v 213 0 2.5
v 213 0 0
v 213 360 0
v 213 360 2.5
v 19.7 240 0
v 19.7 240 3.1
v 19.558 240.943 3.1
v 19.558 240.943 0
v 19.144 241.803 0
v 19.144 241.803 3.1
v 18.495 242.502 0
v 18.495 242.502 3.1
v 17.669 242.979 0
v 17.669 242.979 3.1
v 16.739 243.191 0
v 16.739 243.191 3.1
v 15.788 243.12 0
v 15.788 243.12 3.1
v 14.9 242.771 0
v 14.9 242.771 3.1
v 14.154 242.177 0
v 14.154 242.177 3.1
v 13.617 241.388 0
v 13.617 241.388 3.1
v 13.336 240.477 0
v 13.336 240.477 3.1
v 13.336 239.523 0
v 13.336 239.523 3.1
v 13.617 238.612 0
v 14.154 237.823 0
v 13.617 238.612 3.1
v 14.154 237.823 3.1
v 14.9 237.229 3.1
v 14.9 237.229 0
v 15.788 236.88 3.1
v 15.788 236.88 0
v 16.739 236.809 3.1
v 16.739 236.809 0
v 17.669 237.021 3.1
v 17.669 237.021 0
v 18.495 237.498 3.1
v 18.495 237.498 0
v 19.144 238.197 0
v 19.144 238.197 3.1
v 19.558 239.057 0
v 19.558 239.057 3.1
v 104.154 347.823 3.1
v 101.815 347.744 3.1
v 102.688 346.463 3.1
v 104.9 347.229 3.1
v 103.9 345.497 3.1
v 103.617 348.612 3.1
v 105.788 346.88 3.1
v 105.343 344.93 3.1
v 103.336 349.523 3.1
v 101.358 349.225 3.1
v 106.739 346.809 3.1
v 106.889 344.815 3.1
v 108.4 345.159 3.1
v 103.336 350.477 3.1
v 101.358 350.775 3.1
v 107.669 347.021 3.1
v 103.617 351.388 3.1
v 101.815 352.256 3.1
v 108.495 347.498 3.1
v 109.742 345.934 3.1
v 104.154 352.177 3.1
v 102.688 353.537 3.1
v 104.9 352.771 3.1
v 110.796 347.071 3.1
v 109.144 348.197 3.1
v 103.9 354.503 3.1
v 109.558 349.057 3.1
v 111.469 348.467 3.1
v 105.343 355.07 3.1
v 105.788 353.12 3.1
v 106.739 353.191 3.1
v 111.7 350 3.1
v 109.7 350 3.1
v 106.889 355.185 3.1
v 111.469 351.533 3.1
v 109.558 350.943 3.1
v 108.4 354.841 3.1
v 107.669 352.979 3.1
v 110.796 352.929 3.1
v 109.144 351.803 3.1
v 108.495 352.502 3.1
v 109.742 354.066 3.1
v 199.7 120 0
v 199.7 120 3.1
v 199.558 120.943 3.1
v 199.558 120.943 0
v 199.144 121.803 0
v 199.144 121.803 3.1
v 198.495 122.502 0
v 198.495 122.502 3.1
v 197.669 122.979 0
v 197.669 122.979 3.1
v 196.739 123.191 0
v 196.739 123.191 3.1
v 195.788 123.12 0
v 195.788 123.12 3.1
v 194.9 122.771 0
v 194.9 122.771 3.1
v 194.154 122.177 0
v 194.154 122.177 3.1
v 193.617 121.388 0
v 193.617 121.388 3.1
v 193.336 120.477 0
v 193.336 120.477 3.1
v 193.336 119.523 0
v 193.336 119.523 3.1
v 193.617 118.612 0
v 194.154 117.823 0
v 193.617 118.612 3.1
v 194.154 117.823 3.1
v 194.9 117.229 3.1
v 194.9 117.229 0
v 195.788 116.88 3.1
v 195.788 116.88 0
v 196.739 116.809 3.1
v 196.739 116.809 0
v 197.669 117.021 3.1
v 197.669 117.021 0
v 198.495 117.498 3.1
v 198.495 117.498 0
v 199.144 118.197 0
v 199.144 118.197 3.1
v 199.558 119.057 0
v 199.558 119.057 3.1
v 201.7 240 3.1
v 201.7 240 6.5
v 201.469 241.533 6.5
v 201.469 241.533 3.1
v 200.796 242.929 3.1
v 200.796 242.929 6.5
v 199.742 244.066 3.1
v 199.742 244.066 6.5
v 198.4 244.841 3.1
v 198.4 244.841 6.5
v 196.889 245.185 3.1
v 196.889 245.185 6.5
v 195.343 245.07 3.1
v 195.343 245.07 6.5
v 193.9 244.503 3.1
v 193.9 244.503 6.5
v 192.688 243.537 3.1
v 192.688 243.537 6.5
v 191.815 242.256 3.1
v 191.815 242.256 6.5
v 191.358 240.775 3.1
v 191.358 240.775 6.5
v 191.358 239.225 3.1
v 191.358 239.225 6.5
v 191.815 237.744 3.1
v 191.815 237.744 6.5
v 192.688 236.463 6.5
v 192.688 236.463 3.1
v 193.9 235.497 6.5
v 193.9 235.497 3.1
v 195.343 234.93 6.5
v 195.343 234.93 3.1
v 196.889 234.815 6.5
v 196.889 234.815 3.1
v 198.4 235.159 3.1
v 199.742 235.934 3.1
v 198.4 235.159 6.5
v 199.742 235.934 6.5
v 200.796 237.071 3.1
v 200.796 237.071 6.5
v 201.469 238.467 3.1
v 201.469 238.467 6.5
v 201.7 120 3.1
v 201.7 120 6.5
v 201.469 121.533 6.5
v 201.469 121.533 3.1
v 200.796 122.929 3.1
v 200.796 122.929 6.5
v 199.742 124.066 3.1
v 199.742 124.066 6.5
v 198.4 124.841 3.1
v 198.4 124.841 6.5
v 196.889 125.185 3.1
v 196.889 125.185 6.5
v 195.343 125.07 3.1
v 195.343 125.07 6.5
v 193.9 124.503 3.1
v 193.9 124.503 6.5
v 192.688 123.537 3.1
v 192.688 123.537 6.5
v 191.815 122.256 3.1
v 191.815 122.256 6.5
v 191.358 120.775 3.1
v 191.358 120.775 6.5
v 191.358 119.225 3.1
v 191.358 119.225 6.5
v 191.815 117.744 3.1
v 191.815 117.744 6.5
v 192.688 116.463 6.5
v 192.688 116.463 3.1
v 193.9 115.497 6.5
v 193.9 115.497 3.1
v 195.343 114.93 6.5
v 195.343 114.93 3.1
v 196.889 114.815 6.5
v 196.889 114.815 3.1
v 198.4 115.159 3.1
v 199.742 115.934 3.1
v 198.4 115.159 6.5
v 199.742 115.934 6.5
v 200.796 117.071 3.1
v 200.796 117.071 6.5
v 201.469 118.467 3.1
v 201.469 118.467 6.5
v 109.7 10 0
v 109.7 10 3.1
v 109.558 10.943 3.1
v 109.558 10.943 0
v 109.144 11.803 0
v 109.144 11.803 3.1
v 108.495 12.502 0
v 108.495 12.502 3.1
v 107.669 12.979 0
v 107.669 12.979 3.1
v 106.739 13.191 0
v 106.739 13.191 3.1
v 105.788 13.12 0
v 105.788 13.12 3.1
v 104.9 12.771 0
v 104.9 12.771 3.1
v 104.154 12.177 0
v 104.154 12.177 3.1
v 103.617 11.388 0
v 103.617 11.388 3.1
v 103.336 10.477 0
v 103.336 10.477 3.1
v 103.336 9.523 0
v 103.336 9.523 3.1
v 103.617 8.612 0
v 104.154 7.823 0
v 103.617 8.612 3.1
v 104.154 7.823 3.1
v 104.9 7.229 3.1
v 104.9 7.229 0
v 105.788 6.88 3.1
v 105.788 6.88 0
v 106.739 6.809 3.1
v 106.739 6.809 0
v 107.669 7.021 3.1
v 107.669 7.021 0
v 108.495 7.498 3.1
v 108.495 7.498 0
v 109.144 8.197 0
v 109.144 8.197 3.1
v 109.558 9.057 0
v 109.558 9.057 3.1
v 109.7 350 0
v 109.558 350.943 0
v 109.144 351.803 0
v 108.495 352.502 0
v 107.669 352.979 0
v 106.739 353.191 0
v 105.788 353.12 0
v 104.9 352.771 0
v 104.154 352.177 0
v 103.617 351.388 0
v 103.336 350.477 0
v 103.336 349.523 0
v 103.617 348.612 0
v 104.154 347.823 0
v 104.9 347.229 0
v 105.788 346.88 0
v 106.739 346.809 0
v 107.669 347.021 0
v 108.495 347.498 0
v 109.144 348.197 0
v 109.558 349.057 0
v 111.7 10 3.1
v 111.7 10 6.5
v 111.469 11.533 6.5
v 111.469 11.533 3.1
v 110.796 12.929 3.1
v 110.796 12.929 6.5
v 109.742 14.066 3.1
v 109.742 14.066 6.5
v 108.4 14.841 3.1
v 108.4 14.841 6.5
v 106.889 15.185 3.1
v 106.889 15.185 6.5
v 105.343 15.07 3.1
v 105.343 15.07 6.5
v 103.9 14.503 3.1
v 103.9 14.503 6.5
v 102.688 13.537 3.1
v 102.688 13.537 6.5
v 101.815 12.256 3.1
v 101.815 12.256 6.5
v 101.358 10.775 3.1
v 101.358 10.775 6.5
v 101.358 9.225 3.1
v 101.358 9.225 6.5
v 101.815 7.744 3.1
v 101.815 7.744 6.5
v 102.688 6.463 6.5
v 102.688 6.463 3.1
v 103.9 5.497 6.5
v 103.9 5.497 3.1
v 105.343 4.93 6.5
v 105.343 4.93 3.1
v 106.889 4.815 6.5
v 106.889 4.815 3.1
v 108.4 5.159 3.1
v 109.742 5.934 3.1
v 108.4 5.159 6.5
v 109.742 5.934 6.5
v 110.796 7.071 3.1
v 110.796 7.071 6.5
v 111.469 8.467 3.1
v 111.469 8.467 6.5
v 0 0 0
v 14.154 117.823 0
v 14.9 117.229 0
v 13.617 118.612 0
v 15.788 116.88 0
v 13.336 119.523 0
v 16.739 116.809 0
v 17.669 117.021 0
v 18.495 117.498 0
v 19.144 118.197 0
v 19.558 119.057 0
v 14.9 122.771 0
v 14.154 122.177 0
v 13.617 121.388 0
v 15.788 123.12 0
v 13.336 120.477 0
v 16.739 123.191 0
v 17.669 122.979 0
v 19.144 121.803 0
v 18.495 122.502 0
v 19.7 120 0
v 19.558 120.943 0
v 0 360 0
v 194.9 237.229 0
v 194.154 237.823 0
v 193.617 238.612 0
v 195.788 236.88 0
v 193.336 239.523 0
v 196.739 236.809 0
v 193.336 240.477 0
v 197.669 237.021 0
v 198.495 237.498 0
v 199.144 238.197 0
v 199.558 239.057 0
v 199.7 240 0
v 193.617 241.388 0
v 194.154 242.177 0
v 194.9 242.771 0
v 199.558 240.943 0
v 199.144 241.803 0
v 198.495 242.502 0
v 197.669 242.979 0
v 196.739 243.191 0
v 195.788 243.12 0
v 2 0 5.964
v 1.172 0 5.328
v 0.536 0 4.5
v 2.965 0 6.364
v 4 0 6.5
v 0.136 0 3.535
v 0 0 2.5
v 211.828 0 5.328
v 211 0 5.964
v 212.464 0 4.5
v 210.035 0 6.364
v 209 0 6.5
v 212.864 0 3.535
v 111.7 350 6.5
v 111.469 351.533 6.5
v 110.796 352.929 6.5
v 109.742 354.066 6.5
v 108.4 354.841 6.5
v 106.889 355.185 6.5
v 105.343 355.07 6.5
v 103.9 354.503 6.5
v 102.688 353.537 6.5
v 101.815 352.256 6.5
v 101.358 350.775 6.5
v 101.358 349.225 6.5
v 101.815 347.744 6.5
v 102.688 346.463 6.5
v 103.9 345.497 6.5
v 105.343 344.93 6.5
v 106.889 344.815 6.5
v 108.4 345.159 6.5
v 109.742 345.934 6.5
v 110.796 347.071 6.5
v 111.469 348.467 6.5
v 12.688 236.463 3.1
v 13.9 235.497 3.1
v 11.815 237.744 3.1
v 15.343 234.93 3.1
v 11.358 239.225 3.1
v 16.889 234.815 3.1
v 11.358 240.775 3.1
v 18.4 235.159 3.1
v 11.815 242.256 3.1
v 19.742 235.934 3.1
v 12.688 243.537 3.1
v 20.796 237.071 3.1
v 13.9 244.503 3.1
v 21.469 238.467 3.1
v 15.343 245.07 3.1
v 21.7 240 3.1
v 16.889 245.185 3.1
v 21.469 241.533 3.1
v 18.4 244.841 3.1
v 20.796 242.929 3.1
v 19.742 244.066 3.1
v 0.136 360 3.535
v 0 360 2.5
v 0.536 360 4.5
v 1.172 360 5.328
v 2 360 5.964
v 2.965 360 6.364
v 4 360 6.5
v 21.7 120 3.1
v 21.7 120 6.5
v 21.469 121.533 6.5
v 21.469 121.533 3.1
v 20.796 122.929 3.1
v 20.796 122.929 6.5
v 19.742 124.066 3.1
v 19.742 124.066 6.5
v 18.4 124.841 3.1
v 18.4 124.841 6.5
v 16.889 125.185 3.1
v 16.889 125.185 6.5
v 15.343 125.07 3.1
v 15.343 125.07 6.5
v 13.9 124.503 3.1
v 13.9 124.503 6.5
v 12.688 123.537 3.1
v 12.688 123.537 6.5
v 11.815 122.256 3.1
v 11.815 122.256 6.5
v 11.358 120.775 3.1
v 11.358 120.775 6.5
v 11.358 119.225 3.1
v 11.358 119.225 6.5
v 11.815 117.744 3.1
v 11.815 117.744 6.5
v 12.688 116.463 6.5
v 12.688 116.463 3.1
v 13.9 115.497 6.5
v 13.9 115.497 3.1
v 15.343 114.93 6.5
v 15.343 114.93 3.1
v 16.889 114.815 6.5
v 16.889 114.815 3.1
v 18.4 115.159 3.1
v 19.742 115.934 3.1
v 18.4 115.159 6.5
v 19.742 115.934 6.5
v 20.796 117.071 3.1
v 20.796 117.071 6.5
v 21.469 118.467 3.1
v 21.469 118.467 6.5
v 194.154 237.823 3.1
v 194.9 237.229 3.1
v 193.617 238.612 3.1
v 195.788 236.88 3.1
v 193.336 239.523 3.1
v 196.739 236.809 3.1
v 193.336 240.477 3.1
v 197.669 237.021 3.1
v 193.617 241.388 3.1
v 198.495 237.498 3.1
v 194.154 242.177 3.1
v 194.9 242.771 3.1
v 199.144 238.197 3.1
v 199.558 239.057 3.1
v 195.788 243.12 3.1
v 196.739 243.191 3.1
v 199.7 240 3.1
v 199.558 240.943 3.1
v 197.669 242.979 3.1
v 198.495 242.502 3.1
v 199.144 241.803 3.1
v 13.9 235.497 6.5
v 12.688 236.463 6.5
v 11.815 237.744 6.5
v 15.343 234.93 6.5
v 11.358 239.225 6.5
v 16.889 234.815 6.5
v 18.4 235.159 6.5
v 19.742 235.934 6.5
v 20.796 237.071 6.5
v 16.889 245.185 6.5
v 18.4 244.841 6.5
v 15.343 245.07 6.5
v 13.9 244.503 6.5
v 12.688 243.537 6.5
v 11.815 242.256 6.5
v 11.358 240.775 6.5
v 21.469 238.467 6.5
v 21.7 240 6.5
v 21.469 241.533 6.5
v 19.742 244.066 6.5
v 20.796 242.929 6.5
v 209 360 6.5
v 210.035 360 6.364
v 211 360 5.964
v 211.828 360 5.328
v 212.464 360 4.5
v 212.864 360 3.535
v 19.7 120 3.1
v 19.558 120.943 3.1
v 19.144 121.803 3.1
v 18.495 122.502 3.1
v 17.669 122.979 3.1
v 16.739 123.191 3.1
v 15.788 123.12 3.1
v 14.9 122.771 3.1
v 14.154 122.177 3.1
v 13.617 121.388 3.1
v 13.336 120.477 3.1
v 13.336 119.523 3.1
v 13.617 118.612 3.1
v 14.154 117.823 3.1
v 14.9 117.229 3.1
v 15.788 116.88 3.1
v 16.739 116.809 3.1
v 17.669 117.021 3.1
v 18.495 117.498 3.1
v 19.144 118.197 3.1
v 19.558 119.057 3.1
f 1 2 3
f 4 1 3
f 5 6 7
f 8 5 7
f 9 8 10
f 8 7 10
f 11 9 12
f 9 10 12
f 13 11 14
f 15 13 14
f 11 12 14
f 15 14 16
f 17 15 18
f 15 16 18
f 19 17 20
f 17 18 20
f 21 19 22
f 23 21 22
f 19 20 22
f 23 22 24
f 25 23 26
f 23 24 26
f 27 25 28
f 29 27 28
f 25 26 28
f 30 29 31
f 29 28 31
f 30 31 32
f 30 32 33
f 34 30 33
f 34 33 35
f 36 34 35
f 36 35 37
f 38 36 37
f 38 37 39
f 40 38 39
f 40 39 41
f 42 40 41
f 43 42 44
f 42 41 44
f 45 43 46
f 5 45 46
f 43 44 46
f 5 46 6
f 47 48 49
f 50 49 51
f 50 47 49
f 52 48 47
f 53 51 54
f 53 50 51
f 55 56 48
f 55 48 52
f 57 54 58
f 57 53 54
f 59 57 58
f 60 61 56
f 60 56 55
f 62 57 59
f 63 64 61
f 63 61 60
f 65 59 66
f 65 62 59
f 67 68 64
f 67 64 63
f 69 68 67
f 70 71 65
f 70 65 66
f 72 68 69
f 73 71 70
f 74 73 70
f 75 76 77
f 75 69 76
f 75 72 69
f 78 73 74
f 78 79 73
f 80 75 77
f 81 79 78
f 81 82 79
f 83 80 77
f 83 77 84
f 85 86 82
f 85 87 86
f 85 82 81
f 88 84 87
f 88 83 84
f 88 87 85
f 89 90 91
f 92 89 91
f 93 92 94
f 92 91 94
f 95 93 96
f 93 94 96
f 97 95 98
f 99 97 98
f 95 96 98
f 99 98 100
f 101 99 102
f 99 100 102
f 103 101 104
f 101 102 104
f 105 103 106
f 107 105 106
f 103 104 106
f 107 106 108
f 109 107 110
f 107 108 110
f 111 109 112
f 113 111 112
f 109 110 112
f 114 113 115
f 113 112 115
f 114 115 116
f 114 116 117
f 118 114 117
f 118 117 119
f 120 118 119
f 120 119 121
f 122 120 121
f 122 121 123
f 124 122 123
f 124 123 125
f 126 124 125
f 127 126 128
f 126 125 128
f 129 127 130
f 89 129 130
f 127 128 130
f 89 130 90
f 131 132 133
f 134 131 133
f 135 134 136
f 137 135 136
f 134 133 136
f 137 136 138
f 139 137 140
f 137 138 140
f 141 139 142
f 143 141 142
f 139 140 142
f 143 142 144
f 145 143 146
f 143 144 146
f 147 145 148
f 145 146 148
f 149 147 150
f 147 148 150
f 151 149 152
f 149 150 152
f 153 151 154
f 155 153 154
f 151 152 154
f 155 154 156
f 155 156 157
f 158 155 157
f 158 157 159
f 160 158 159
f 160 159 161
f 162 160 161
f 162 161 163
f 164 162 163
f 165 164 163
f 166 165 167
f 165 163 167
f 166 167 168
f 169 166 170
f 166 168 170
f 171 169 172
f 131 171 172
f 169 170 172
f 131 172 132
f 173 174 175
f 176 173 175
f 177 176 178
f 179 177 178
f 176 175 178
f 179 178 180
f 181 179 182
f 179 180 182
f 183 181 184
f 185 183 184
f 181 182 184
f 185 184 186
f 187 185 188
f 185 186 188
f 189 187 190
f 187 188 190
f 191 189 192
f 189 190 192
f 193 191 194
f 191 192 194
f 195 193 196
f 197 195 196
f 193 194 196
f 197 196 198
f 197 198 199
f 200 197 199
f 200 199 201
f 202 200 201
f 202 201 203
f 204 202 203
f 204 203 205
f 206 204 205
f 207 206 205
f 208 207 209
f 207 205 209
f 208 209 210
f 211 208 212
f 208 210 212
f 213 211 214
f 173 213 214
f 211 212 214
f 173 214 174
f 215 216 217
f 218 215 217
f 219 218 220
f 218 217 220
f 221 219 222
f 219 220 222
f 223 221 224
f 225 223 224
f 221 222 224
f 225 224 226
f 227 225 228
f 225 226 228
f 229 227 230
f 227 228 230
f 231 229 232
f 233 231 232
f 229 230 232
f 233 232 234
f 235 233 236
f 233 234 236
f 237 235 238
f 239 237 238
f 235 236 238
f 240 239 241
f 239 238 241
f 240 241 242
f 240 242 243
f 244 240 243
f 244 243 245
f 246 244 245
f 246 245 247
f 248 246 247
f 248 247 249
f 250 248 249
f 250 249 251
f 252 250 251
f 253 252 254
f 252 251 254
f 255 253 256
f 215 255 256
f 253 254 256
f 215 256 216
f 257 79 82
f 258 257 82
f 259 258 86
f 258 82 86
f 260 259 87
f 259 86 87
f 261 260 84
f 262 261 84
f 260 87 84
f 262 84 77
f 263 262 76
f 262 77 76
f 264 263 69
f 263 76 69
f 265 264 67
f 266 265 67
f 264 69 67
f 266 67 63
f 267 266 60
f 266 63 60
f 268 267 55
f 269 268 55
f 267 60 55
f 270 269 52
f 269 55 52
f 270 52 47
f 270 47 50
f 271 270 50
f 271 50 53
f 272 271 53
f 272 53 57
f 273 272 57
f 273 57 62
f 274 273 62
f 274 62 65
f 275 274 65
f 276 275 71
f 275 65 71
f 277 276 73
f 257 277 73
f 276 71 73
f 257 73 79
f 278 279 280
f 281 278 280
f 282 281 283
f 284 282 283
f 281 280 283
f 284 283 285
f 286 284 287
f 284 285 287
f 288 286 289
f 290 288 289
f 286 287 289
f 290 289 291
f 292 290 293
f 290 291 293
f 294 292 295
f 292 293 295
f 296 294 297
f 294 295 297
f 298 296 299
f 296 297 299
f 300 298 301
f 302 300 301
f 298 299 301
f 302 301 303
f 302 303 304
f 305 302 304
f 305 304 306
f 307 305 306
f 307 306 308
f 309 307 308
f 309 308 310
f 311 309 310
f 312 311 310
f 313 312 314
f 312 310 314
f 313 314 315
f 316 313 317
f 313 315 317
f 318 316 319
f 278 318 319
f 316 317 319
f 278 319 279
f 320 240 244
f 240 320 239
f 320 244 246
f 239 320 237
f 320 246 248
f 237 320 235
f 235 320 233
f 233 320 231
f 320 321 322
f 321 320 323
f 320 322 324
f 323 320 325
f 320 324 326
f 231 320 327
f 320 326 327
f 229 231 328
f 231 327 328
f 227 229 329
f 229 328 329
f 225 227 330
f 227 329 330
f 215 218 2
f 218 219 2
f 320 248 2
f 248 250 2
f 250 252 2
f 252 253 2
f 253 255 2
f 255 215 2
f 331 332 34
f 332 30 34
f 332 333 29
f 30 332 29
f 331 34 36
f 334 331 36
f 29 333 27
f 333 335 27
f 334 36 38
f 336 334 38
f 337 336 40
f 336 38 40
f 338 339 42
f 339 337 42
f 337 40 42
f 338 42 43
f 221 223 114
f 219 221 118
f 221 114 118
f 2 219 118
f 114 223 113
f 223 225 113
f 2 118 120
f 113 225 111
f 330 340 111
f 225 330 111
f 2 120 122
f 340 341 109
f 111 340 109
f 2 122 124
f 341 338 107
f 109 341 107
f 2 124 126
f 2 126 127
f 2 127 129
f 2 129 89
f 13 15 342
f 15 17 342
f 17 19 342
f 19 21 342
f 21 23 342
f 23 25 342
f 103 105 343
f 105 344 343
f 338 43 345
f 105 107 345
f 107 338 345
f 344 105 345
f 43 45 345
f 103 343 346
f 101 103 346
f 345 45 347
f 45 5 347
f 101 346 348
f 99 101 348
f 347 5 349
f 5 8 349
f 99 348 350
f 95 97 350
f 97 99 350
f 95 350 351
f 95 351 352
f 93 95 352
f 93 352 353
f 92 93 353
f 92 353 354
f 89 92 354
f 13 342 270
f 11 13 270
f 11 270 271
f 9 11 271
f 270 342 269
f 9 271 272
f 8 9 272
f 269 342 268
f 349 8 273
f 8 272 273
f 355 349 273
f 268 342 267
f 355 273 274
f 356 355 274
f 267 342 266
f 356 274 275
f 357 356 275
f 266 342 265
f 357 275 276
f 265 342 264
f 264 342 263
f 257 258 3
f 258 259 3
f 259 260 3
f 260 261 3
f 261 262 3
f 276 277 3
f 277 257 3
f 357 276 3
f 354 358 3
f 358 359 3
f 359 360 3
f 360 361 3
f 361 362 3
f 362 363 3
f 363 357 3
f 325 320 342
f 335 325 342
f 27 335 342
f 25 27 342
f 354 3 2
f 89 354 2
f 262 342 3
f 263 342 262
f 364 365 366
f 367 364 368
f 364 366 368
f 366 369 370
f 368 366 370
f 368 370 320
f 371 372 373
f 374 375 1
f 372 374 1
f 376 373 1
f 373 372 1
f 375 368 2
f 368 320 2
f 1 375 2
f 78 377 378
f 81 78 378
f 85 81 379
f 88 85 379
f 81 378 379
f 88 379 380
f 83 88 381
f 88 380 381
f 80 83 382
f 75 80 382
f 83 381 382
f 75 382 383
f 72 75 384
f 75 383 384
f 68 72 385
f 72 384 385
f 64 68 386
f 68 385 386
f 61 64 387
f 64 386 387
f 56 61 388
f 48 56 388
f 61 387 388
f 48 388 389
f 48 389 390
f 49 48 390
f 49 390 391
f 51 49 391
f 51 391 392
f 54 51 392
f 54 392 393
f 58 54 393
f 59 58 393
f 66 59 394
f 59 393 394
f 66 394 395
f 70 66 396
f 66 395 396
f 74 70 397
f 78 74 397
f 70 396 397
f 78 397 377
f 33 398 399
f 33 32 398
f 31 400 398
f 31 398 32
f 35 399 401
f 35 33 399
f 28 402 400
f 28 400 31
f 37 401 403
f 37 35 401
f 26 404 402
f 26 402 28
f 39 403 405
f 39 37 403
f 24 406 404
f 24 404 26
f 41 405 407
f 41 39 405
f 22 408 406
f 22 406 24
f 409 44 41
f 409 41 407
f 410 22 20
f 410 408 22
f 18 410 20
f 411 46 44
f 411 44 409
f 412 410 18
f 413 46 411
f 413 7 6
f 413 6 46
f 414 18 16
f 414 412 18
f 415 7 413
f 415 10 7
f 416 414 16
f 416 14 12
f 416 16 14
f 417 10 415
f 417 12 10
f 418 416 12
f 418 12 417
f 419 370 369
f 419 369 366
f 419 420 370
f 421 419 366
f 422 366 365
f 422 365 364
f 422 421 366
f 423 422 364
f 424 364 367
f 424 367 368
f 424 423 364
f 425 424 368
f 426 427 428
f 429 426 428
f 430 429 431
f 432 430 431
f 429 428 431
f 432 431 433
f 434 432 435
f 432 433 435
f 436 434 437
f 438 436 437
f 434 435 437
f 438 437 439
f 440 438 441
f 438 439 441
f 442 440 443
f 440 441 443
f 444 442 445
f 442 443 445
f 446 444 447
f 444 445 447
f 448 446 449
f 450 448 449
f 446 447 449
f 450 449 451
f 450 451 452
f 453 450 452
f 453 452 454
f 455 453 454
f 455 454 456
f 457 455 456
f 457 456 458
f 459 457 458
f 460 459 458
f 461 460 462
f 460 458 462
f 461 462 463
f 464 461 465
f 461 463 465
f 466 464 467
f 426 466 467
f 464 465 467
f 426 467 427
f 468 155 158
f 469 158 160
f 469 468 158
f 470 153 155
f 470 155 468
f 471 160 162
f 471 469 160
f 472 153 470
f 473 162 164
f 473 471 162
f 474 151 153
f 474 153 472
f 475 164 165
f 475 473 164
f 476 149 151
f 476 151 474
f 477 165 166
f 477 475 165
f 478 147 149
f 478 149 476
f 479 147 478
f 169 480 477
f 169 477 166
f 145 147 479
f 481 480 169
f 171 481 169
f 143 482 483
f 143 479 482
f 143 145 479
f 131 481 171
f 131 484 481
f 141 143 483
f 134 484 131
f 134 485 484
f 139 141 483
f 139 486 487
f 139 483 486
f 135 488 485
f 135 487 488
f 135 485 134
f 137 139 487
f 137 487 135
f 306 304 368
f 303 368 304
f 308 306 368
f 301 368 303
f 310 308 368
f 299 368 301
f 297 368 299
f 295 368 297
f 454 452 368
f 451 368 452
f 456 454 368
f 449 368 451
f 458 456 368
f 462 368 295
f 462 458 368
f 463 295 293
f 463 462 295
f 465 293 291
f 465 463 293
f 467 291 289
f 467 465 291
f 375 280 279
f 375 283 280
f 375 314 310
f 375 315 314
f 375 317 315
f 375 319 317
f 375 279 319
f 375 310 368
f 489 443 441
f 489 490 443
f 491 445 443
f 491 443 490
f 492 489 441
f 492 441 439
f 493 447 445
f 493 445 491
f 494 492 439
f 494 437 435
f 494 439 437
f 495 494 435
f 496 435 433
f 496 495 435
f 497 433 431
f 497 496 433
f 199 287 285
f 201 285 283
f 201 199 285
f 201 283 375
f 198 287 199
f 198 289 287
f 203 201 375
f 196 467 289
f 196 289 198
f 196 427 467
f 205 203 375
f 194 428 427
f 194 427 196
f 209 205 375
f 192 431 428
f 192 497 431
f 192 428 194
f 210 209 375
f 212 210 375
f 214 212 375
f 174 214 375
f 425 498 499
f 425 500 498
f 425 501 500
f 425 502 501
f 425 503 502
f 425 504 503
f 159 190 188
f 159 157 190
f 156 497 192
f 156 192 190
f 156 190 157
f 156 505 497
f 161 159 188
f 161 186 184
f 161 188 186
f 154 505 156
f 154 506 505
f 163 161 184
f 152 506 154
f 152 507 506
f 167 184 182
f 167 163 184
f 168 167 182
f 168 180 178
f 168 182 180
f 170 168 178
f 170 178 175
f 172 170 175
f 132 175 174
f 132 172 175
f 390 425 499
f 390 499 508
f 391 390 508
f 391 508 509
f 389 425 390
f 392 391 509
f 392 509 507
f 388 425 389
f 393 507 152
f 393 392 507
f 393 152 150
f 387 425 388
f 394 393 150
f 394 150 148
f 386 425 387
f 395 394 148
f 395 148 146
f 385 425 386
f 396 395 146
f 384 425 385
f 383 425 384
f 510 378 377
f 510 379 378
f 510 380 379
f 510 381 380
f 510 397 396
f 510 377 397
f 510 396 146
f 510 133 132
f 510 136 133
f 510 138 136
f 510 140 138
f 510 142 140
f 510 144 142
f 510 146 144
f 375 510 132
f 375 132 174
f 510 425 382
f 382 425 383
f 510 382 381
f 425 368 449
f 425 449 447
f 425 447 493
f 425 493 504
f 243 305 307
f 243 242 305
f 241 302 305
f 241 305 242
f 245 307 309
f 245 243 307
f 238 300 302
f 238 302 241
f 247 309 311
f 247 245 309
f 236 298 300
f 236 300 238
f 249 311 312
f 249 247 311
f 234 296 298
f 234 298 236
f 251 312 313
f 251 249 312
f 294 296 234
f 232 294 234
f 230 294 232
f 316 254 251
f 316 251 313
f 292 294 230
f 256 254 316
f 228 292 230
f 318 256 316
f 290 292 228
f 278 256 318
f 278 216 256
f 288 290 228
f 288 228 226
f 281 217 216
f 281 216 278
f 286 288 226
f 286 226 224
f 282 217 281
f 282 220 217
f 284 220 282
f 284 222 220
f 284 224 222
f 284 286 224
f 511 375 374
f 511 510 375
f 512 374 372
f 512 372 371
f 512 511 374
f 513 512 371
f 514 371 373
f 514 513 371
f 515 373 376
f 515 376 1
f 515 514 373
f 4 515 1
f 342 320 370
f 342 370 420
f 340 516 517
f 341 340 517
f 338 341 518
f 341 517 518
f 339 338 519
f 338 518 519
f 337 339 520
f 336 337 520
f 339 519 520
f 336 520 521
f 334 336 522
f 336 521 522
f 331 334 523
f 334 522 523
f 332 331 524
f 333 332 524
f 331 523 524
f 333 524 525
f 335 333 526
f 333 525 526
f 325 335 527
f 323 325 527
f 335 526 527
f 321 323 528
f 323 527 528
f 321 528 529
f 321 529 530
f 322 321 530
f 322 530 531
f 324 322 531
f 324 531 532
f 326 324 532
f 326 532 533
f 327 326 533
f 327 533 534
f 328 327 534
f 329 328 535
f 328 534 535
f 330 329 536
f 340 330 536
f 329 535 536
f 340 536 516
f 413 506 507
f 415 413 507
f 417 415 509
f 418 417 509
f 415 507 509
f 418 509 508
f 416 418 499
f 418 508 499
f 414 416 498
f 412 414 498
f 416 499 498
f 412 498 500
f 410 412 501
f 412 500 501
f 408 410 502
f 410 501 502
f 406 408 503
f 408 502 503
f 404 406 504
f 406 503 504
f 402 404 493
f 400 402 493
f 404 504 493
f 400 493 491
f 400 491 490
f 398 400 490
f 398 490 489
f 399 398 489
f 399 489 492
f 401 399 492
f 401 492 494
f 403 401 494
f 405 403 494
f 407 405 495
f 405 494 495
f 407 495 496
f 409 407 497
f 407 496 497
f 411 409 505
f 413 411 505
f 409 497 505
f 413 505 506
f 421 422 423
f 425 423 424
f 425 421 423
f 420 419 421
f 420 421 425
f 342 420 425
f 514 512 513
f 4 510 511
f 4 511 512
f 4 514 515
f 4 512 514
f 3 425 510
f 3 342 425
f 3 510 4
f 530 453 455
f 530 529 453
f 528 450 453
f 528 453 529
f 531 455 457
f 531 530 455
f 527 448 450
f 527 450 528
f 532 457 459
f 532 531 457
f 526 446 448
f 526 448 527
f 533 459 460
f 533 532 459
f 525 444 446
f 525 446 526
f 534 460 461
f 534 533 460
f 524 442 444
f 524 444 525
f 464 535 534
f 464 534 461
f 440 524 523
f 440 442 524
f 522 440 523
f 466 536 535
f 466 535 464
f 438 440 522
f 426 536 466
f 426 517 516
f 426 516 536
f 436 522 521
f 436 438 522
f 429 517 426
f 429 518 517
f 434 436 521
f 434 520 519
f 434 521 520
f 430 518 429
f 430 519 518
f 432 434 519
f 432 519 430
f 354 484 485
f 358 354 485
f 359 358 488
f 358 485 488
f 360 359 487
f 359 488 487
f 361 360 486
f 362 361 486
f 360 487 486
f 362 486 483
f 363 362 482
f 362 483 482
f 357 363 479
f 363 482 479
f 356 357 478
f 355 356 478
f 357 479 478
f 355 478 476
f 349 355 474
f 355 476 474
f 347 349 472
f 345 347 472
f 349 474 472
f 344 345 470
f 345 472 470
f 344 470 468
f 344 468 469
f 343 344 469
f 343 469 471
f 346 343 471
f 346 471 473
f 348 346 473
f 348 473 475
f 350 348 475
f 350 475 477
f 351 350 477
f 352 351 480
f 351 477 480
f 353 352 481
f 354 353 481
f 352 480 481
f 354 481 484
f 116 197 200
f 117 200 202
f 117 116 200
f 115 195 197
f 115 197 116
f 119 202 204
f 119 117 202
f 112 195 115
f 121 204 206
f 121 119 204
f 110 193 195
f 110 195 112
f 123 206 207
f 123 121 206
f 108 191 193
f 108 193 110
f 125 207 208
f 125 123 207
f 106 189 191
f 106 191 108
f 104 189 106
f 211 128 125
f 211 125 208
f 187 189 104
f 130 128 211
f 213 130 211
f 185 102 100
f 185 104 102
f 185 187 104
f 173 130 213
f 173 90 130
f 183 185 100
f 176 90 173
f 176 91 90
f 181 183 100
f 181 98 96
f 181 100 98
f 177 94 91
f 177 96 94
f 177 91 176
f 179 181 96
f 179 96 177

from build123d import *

# Parameters (mm, degrees)
SKETCH_W        = 213
SKETCH_H        = 360
PAD_DEPTH       = 6.5
SKETCH001_R     = 5.2
POCKET_DEPTH    = 3.4
SKETCH002_R     = 3.2
POCKET001_DEPTH = 3.1
FILLET_R        = 4


with BuildPart() as part:
    # Sketch → Pad (new body)
    with BuildSketch(Plane.XY):
        with Locations((106.5, 180)):
            Rectangle(SKETCH_W, SKETCH_H)
    extrude(amount=PAD_DEPTH)

    # Sketch001 (on Face6 of Pad) → Pocket (cut)
    with BuildSketch(Plane.XY.offset(6.5)):
        with Locations((106.5, 350)):
            Circle(SKETCH001_R)
        with Locations((16.5, 240)):
            Circle(SKETCH001_R)
        with Locations((16.5, 120)):
            Circle(SKETCH001_R)
        with Locations((196.5, 240)):
            Circle(SKETCH001_R)
        with Locations((196.5, 120)):
            Circle(SKETCH001_R)
        with Locations((106.5, 10)):
            Circle(SKETCH001_R)
    extrude(amount=-POCKET_DEPTH, mode=Mode.SUBTRACT)

    # Sketch002 (on Face17 of Pocket) → Pocket001 (cut)
    with BuildSketch(Plane.XY.offset(3.1)):
        with Locations((106.5, 350)):
            Circle(SKETCH002_R)
        with Locations((16.5, 240)):
            Circle(SKETCH002_R)
        with Locations((16.5, 120)):
            Circle(SKETCH002_R)
        with Locations((196.5, 240)):
            Circle(SKETCH002_R)
        with Locations((196.5, 120)):
            Circle(SKETCH002_R)
        with Locations((106.5, 10)):
            Circle(SKETCH002_R)
    extrude(amount=-POCKET001_DEPTH, mode=Mode.SUBTRACT)

    # Fillet
    fillet_edges = [part.edges().sort_by_distance(p)[0] for p in [
        (213, 180, 6.5),
        (0, 180, 6.5),
    ]]
    fillet(fillet_edges, radius=FILLET_R)


solid = part.part
